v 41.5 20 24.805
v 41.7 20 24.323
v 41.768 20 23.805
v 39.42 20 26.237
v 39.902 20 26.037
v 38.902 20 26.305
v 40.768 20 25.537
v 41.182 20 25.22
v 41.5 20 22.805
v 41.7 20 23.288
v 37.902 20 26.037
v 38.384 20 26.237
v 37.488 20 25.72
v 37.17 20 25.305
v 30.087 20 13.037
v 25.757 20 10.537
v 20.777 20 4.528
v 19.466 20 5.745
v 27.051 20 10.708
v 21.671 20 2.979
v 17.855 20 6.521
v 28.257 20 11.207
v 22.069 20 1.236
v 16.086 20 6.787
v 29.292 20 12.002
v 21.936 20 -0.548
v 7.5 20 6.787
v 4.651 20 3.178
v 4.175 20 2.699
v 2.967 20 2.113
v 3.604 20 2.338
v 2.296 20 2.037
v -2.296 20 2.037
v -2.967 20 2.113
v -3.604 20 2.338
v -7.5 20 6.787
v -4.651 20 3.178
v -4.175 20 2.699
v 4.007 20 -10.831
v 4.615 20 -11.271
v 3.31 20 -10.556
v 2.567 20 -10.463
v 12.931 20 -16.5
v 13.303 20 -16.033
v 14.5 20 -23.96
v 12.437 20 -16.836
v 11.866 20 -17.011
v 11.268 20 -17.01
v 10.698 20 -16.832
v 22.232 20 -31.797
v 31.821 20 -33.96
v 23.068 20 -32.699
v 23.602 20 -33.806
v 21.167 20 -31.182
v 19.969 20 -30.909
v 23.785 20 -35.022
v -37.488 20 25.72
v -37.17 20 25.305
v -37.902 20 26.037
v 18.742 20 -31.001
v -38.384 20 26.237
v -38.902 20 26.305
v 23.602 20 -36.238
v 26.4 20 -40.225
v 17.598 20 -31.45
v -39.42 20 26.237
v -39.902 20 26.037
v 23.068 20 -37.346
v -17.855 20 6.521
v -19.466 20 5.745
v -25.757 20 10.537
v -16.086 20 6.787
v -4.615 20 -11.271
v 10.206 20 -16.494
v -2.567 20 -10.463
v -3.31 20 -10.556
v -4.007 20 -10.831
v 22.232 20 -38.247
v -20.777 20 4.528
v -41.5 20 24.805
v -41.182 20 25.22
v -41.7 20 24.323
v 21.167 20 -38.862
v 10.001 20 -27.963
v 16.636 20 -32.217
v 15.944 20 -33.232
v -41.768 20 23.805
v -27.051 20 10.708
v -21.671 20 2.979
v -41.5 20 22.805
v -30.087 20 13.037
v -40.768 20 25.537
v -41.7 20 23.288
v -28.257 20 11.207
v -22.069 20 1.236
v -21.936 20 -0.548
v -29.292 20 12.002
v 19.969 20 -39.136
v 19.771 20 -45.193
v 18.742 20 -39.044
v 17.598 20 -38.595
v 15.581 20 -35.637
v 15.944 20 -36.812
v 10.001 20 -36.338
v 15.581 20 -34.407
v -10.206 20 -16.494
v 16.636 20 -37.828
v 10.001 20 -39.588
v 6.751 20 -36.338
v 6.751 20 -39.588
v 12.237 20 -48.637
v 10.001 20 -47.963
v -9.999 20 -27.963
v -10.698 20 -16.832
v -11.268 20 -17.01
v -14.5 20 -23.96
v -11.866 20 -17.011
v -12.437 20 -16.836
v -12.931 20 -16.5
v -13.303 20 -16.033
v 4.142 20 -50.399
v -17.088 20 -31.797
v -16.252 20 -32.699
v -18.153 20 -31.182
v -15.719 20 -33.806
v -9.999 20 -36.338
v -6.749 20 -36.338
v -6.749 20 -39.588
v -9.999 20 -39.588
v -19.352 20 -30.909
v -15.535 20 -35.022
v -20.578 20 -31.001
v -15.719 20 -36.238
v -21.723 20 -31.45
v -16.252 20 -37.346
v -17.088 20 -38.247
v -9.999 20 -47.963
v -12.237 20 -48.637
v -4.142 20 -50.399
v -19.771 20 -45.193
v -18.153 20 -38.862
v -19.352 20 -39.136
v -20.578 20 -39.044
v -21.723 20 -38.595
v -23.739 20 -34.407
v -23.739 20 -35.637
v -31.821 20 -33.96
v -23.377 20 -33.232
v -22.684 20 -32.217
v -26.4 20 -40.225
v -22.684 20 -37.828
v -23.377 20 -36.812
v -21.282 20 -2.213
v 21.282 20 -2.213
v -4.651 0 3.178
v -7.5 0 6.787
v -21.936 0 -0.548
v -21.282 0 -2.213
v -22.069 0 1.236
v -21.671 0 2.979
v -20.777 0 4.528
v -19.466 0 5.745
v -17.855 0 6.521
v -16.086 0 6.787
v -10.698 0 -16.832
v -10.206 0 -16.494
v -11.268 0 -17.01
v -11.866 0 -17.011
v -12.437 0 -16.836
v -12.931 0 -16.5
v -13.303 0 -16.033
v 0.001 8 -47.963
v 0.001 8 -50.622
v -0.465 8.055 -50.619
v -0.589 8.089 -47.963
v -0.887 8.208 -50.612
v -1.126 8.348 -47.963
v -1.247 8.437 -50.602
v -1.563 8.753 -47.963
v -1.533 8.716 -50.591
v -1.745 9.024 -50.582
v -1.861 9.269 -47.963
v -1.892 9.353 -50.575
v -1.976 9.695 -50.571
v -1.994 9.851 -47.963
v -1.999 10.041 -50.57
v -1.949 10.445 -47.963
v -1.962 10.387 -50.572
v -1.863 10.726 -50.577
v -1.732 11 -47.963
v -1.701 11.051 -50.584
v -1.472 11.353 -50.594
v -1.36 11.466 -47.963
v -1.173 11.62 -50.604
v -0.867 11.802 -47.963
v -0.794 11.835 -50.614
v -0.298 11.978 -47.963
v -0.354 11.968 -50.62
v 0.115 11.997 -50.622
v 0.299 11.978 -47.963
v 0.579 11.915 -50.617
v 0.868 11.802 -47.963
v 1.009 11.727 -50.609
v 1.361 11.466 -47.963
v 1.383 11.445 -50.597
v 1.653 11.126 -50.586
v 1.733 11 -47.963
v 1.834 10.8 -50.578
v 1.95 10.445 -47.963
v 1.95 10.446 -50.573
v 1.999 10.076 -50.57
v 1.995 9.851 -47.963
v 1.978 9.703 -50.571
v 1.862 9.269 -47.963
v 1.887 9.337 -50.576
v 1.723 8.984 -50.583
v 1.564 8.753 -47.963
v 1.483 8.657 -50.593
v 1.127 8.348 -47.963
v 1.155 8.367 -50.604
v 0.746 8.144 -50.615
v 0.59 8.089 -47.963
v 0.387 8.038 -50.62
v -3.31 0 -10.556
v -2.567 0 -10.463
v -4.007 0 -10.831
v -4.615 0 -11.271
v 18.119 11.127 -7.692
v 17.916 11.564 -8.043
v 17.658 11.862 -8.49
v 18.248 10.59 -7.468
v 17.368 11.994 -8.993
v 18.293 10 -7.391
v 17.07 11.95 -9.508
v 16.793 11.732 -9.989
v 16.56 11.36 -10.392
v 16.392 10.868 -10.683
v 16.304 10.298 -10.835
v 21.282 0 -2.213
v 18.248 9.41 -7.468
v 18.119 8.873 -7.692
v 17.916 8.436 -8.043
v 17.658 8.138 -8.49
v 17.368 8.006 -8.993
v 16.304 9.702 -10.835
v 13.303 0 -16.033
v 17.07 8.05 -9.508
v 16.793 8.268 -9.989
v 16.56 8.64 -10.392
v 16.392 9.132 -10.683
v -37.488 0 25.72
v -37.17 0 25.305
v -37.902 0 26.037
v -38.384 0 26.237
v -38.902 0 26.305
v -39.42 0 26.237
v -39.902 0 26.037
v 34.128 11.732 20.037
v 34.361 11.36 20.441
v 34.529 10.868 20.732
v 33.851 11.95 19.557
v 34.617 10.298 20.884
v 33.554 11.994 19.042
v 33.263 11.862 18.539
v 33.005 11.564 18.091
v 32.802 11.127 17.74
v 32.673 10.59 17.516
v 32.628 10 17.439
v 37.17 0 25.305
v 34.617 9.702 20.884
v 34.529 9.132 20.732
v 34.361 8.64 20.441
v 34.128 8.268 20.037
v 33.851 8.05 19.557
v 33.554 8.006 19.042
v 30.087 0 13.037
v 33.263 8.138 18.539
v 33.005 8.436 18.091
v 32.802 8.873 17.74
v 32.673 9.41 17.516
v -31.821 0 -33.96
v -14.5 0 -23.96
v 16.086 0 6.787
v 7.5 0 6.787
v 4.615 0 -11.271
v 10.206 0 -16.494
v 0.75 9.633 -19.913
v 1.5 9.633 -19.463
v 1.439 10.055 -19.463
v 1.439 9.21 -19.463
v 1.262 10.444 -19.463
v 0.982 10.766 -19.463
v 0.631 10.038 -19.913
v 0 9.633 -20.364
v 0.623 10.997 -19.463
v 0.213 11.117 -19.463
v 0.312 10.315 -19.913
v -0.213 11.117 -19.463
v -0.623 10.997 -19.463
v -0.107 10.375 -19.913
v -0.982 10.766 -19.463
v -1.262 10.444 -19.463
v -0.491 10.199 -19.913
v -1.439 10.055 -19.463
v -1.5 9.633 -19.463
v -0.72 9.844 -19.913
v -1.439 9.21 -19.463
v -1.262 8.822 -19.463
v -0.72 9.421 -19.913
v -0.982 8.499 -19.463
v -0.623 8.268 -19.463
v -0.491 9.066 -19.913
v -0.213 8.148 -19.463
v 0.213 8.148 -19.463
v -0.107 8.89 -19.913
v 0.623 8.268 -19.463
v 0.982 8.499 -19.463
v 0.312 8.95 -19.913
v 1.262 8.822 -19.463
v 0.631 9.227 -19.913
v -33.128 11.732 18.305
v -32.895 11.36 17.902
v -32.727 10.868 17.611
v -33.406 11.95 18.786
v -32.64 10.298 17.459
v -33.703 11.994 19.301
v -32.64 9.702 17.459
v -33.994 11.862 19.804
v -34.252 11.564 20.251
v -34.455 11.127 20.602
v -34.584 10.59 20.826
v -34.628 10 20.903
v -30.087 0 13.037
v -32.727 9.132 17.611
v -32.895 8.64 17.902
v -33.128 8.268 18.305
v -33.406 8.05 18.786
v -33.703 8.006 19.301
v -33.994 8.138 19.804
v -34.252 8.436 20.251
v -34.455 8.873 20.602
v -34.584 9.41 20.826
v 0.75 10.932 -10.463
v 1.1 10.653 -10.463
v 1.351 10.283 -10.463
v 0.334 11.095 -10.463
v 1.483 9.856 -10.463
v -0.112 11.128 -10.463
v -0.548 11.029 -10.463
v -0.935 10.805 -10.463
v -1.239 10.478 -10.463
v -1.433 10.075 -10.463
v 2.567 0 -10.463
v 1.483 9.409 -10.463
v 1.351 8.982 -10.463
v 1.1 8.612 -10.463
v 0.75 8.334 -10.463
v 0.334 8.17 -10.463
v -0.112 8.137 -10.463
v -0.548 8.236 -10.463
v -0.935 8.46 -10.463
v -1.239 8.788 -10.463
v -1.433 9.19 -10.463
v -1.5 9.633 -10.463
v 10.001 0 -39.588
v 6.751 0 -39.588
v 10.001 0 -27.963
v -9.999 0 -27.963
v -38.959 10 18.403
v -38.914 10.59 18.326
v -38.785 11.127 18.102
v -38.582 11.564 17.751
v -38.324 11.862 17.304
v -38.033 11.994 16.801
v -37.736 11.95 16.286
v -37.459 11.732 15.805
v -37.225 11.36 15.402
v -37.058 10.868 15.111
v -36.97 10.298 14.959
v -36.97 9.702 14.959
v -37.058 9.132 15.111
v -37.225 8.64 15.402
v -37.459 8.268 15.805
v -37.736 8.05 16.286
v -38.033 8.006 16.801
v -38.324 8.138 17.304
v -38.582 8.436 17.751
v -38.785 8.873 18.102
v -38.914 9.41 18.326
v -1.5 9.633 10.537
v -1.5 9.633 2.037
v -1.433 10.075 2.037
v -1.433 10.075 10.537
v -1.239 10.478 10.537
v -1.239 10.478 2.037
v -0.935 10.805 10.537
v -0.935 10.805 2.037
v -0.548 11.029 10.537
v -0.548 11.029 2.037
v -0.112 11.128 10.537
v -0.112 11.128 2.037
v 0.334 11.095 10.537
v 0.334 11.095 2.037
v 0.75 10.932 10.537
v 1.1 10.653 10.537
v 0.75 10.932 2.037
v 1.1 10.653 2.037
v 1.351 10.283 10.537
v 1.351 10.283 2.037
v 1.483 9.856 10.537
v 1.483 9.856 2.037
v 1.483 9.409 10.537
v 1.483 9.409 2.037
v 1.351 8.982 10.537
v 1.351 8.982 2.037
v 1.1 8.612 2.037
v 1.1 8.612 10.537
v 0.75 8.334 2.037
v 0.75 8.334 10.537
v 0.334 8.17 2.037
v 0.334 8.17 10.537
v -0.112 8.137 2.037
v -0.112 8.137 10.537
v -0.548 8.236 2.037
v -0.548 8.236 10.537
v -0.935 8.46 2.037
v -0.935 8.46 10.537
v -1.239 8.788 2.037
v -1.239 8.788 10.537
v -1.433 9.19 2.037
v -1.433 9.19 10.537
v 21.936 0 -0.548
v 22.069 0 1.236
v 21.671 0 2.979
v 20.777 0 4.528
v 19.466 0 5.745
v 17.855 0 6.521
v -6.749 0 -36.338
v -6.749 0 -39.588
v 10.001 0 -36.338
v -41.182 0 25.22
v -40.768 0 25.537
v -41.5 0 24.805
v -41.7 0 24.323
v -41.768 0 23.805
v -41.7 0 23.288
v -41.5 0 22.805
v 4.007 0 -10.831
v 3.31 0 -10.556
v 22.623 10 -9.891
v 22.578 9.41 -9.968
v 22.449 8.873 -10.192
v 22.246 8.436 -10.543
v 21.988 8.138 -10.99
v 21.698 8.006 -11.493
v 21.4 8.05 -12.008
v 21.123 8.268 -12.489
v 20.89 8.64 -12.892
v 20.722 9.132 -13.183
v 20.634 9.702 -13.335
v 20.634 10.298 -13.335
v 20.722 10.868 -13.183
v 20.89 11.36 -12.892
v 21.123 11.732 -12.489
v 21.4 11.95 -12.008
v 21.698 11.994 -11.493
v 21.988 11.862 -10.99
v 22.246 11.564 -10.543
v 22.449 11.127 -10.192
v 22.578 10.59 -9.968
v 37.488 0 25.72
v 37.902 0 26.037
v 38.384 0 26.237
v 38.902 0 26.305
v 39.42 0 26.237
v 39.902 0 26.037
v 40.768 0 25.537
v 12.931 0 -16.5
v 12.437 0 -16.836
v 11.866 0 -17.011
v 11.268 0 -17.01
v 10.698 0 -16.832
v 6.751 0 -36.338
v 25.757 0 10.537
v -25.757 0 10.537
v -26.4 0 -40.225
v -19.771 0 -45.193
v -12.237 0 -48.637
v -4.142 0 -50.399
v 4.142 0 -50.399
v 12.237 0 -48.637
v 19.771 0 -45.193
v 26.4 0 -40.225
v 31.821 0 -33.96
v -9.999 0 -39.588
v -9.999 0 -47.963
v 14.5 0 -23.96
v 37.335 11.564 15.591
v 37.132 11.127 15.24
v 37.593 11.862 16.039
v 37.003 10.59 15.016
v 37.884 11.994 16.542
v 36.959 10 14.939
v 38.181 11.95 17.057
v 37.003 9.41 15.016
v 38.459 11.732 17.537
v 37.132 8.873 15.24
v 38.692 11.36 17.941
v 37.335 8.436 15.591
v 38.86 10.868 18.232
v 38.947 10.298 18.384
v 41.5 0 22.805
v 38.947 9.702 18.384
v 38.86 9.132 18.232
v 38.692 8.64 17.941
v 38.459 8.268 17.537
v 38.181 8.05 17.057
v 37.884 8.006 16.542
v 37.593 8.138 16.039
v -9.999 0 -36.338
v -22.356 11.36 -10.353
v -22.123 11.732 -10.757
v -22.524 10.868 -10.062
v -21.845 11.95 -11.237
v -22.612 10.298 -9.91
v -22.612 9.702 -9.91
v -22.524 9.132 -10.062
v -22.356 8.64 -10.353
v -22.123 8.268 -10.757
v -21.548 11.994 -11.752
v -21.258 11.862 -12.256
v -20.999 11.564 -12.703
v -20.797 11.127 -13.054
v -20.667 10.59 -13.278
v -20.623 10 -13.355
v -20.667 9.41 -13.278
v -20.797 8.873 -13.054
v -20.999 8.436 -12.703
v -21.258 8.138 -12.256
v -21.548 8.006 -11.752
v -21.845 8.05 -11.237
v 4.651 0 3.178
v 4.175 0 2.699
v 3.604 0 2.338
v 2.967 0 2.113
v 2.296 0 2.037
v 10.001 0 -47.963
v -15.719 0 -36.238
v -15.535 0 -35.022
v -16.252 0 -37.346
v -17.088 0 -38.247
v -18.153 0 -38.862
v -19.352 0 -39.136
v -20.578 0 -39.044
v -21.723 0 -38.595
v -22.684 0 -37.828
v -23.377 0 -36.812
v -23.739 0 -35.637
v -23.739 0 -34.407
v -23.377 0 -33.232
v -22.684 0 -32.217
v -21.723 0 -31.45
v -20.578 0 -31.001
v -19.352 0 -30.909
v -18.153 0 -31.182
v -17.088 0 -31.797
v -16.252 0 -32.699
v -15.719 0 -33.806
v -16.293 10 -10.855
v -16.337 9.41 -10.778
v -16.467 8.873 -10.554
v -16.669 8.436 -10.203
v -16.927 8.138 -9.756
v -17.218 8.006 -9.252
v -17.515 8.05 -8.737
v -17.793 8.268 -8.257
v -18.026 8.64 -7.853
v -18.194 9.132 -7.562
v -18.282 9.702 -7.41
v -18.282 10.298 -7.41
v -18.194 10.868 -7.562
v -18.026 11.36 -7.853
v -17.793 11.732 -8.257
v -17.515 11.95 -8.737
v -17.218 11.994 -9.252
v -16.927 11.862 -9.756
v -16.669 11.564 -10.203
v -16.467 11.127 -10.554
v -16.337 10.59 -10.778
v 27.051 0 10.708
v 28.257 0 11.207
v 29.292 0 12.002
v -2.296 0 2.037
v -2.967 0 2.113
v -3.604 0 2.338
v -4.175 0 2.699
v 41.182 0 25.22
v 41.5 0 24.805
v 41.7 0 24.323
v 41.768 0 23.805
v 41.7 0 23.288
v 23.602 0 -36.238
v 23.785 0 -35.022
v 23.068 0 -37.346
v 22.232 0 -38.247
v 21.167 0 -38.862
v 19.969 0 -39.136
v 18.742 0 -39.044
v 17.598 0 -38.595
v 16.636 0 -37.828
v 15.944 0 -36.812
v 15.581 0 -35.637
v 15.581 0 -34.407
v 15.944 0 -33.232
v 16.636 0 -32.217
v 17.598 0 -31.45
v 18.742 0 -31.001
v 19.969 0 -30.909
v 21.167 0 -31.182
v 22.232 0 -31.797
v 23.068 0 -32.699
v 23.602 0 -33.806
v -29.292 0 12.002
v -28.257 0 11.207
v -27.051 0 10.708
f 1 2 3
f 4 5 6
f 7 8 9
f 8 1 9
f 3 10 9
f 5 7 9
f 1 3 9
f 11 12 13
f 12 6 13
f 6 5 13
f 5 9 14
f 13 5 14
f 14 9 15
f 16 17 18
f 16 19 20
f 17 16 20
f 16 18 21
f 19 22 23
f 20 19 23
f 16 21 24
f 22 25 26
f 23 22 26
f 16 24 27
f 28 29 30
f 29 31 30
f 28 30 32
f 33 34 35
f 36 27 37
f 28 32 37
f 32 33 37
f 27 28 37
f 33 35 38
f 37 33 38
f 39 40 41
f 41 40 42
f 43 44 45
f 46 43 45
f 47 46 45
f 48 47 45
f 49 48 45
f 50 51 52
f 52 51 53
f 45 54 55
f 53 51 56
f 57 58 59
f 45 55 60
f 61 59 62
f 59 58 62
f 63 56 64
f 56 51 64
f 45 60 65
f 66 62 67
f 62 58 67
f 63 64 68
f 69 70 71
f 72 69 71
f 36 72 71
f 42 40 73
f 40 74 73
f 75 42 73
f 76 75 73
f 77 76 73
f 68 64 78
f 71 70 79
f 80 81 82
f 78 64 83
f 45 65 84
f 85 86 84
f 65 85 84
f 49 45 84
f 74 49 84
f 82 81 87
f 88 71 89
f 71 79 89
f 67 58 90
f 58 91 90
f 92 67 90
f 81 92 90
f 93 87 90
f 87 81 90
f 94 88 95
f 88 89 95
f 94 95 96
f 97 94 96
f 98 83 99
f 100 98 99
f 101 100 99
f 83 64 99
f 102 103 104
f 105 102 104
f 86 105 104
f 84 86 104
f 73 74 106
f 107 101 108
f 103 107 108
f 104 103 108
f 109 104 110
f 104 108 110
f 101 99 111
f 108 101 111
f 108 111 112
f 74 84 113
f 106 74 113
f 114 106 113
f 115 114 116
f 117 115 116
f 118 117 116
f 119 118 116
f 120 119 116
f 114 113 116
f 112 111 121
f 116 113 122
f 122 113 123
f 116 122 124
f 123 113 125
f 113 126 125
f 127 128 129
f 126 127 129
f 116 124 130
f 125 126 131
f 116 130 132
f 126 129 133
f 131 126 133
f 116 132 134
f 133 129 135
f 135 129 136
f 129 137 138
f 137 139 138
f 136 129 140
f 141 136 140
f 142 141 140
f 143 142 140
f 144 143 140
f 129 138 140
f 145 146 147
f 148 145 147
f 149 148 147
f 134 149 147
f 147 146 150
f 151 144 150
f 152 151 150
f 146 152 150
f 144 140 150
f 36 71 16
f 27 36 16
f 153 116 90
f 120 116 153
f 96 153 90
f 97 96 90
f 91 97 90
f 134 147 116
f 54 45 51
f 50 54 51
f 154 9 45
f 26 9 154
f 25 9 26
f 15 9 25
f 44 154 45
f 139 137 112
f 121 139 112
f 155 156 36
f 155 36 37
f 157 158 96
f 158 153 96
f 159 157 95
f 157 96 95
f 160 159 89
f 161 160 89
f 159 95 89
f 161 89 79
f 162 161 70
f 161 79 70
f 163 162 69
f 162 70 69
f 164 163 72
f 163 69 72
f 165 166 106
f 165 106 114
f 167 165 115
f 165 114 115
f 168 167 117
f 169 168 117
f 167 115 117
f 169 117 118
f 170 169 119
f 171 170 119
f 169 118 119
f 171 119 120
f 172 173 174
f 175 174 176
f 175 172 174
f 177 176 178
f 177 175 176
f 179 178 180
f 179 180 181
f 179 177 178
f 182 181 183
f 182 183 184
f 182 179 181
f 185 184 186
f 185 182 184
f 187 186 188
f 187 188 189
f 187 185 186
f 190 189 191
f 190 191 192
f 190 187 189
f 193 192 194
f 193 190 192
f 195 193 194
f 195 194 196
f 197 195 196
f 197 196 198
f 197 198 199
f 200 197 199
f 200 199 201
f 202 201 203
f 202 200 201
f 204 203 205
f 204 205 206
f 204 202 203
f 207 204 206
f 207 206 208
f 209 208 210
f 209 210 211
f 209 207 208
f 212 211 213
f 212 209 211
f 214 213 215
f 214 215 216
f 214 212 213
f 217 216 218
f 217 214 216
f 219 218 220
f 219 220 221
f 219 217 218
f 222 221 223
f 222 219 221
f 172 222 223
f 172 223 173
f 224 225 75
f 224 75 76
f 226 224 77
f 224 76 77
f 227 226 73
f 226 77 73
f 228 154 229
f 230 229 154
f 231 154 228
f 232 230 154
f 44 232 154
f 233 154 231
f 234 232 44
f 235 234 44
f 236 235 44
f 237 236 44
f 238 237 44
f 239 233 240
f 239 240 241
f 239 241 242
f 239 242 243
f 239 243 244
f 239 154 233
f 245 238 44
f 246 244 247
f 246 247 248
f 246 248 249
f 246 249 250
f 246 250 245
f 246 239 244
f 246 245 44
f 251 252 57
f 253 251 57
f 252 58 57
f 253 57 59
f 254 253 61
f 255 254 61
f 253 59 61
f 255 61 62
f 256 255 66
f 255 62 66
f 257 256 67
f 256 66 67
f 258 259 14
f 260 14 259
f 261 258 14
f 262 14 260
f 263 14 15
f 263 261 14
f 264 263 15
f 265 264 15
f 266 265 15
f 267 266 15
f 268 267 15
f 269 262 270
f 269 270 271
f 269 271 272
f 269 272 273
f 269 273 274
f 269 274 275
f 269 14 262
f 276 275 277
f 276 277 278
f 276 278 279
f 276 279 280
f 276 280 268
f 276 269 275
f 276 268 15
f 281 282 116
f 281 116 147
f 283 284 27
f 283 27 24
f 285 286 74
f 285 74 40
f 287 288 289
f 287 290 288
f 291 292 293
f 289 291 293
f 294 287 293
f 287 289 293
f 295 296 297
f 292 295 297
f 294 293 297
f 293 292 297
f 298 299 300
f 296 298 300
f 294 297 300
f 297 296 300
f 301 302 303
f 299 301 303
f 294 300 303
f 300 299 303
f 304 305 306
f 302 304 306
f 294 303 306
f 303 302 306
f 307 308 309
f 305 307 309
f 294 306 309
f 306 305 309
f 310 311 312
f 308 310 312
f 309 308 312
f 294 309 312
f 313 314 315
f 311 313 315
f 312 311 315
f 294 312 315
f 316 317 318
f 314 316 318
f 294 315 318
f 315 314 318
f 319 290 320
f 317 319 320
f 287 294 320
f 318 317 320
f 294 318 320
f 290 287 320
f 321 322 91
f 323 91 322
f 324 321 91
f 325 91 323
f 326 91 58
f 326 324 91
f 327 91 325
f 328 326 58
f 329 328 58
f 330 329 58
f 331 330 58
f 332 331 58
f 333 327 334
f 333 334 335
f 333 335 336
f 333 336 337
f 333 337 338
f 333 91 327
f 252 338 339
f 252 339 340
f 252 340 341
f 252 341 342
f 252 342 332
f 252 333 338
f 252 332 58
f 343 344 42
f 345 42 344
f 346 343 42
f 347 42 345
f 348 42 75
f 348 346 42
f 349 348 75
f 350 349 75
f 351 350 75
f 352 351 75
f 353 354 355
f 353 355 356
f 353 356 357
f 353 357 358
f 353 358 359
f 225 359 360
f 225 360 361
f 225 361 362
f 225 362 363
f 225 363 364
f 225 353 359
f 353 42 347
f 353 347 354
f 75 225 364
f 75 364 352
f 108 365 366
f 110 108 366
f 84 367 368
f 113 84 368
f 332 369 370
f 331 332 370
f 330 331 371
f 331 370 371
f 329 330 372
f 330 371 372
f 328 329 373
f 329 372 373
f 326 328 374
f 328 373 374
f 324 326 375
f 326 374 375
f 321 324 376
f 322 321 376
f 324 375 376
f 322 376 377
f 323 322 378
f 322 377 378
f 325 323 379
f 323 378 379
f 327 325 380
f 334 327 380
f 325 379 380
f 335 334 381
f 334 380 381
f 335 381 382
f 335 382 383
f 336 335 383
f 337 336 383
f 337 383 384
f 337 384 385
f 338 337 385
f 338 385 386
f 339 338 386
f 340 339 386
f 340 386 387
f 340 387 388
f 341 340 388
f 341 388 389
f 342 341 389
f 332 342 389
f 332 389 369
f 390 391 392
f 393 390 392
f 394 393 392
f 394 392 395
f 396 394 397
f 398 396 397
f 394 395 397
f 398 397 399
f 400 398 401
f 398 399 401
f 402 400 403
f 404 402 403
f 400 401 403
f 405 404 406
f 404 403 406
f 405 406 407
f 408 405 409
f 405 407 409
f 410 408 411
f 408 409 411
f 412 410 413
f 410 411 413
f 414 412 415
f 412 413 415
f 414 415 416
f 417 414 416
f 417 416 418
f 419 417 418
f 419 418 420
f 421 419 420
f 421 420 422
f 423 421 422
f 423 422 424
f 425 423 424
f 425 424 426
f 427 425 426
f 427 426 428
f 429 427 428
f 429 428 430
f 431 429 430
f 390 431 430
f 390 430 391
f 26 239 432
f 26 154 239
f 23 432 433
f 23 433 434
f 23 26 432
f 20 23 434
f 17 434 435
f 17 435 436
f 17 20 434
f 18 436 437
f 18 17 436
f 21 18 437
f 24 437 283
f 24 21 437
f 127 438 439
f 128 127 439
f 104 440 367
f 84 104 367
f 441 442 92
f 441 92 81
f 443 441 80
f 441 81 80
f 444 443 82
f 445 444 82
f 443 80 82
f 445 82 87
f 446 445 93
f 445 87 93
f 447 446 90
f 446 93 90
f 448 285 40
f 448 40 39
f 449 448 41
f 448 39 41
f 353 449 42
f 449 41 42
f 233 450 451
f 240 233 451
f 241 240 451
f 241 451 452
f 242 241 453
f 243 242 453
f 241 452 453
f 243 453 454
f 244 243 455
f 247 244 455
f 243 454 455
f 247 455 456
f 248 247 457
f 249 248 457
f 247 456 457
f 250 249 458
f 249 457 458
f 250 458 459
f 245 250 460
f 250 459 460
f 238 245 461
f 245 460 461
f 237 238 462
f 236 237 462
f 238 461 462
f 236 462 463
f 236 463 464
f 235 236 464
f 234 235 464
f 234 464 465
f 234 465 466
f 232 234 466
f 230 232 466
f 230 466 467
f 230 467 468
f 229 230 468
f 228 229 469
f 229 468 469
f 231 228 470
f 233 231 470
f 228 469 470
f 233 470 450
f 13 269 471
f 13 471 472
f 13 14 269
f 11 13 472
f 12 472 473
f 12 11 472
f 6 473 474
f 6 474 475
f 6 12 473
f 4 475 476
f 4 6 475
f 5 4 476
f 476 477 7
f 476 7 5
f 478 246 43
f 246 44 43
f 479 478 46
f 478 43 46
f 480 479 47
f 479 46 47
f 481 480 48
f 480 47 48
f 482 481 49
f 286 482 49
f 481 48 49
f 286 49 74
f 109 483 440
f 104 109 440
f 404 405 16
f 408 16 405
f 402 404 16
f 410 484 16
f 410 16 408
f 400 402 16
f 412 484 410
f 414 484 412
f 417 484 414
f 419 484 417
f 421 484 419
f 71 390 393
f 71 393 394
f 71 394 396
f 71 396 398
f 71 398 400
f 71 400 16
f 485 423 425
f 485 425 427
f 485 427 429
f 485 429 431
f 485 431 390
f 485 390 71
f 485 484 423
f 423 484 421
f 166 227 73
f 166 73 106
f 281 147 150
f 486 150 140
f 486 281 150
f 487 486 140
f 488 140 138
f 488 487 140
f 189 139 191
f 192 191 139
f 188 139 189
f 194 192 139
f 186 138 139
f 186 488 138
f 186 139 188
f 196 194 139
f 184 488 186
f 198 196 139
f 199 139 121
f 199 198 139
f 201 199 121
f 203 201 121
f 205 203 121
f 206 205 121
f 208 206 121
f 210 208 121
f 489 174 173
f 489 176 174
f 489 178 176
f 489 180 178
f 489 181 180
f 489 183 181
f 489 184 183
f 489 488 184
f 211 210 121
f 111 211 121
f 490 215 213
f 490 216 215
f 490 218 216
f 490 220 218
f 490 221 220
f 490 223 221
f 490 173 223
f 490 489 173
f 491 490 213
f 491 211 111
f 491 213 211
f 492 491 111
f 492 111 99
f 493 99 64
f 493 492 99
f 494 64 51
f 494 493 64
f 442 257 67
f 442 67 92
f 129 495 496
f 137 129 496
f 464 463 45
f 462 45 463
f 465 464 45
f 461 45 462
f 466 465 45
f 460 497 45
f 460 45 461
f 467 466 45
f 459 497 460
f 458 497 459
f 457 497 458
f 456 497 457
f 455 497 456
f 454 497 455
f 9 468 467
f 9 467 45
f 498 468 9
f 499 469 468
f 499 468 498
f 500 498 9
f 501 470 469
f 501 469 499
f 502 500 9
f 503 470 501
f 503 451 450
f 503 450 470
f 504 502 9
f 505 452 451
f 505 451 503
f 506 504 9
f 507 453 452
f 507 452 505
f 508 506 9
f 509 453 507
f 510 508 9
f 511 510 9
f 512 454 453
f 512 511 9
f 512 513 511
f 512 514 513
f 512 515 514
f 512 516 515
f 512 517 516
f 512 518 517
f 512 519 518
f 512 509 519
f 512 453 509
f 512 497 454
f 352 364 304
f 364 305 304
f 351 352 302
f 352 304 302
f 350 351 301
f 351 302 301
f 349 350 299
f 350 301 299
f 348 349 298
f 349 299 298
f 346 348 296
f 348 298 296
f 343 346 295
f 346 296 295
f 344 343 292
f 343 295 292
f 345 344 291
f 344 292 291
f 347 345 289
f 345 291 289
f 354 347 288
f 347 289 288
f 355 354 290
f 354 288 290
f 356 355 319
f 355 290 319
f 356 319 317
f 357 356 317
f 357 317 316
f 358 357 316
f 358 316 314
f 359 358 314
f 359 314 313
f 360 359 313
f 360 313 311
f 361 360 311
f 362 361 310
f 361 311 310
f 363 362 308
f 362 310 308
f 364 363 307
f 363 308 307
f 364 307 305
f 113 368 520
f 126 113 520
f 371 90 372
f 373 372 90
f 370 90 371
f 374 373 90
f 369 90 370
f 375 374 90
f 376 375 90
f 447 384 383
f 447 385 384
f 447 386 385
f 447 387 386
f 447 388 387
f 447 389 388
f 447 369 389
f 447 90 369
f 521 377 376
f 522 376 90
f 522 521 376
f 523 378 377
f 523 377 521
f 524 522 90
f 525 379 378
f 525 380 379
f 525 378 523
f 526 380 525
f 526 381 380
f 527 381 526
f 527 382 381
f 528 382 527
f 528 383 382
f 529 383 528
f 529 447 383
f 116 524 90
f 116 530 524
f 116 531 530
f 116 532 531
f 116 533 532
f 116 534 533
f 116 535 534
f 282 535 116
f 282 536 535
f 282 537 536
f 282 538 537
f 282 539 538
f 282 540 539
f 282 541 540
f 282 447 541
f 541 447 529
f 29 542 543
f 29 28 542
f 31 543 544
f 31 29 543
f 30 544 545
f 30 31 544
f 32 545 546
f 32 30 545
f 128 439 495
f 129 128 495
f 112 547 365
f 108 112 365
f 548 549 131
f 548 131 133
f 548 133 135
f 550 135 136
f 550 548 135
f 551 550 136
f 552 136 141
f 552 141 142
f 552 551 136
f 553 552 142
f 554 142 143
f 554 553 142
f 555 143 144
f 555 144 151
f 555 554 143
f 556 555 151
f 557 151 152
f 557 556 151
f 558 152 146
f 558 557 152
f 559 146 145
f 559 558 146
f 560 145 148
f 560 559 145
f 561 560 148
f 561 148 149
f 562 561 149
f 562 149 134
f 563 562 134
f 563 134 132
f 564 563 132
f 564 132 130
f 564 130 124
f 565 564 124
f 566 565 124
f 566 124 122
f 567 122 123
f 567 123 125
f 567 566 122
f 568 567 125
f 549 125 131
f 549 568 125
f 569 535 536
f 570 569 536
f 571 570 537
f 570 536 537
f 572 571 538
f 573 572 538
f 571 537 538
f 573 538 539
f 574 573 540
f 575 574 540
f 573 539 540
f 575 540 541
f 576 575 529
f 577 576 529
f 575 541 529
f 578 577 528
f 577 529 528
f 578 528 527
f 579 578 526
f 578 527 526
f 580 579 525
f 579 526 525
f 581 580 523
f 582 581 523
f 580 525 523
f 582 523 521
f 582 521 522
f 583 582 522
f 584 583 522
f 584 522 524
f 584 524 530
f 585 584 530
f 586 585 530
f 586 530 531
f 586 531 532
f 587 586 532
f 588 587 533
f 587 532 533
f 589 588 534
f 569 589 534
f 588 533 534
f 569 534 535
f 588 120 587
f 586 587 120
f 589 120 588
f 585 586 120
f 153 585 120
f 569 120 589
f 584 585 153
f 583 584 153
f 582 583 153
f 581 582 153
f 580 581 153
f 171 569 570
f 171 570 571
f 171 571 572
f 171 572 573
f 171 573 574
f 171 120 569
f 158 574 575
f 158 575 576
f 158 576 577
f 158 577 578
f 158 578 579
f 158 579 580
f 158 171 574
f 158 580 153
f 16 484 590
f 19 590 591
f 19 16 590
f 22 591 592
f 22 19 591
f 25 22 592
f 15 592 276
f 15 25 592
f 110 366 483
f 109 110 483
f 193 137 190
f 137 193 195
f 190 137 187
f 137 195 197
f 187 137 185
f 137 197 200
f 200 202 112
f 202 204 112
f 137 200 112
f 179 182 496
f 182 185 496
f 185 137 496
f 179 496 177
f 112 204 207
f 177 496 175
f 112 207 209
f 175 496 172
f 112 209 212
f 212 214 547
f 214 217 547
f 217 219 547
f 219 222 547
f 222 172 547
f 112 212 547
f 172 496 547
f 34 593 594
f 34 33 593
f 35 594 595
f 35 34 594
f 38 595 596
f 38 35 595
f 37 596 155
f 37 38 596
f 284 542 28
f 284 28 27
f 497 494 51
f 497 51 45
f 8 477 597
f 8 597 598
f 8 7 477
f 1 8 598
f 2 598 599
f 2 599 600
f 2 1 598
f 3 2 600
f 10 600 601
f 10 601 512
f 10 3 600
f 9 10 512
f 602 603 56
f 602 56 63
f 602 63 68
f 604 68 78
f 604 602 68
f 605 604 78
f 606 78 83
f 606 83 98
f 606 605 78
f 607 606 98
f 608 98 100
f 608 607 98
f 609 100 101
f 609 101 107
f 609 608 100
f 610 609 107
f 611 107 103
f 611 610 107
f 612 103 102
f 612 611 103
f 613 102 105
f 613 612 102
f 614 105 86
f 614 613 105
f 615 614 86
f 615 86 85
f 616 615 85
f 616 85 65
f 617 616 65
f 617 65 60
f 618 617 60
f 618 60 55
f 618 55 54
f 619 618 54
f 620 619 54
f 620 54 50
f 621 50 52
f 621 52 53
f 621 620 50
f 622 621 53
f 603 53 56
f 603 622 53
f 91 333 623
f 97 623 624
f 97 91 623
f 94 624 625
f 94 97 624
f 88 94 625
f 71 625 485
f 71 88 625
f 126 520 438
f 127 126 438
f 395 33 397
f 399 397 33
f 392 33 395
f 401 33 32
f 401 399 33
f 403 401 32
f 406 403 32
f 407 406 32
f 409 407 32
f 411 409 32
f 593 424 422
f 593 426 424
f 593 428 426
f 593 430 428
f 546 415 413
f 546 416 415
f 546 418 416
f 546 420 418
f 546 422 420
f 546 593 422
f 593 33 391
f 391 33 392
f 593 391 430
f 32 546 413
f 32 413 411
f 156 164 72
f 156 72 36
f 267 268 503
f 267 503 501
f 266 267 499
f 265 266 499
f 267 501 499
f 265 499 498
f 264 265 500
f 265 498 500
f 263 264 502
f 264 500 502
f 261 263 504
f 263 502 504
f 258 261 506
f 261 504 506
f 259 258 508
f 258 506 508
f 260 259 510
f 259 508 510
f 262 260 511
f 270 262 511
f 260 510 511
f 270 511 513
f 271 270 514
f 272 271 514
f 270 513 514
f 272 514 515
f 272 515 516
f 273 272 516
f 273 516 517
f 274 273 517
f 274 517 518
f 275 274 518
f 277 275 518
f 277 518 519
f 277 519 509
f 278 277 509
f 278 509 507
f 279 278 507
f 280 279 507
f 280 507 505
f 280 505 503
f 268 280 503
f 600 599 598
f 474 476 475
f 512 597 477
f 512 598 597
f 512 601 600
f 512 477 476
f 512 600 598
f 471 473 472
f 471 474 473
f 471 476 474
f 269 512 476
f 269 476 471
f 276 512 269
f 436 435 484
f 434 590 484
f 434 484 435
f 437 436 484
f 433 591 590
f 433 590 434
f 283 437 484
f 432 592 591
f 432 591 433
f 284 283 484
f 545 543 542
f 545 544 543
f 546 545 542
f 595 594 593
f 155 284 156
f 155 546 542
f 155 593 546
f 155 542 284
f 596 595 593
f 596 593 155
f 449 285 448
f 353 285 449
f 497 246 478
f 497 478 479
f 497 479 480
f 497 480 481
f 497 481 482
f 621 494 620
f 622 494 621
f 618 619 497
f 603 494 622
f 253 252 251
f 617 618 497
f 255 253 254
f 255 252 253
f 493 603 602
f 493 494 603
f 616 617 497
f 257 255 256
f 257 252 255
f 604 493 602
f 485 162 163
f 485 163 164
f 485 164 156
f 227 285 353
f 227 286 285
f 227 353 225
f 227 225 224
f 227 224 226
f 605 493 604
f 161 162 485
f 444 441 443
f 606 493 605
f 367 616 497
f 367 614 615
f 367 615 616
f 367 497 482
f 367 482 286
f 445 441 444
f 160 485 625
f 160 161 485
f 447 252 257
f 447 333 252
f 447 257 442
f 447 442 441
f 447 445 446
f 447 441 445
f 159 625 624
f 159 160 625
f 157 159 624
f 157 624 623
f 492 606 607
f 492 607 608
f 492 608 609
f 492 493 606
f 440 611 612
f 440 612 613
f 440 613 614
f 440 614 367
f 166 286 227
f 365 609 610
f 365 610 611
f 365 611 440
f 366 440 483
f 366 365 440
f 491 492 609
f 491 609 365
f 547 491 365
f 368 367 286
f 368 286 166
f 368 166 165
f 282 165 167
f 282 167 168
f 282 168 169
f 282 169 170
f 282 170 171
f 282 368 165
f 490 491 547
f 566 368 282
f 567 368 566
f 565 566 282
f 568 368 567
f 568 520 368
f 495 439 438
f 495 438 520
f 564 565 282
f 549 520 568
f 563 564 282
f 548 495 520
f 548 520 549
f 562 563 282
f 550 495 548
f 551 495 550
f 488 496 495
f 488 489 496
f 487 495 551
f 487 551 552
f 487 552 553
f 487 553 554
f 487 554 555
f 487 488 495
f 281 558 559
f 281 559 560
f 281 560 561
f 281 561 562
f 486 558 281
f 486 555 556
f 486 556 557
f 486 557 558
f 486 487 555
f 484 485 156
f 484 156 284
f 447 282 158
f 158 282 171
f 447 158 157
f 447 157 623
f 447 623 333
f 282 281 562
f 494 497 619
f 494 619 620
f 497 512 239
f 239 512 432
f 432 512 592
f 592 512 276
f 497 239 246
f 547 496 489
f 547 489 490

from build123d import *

# Parameters (mm, degrees)
SKETCH1_R                  = 4.125
BOSS_EXTRUDE1_DEPTH        = 20
FILLET2_R                  = 5
FILLET3_R                  = 5
FILLET4_R                  = 6
FILLET5_R                  = 6
FILLET6_R                  = 2
FILLET7_R                  = 3
FILLET10_R                 = 2
UPPER_VERTEX_HOLES_D       = 3
UPPER_VERTEX_HOLES_DEPTH   = 30
UPPER_VERTEX_HOLES_TIP     = 0.901290929
F_8_0_199_DIAMETER_HOLE2_D = 4
F_8_0_199_DIAMETER_HOLE3_D = 4
SKETCH12_W                 = 2
SKETCH12_H                 = 41.945563192
SKETCH16_W                 = 2
SKETCH16_H                 = 41.945563192


with BuildPart() as part:
    # Sketch1 → Boss-Extrude1 (new body)
    with BuildSketch(Plane(origin=(0, 0, 0), x_dir=(1, 0, 0), z_dir=(0, 1, 0))):
        with BuildLine():
            Line((-28.643593539, -10.537386441), (-38.169872981, -27.037386441))
            Line((-38.169872981, -27.037386441), (-42.5, -24.537386441))
            Line((-42.5, -24.537386441), (-14.5, 23.960036171))
            Line((-14.5, 23.960036171), (-31.820508076, 33.960036171))
            ThreePointArc((-31.820508076, 33.960036171), (0, 50.621689136), (31.820508076, 33.960036171))
            Line((31.820508076, 33.960036171), (14.5, 23.960036171))
            Line((14.5, 23.960036171), (42.5, -24.537386441))
            Line((42.5, -24.537386441), (38.169872981, -27.037386441))
            Line((38.169872981, -27.037386441), (28.643593539, -10.537386441))
            Line((28.643593539, -10.537386441), (-28.643593539, -10.537386441))
        make_face()
        with Locations((19.660254038, 35.022213998)):
            Circle(SKETCH1_R, mode=Mode.SUBTRACT)
        with Locations((-19.660254038, 35.022213998)):
            Circle(SKETCH1_R, mode=Mode.SUBTRACT)
        Polygon((-12.0447733, 18.212613559), (-26.47853003, -6.787386441), (-7.5, -6.787386441), (-3.75, -2.037386441), (3.75, -2.037386441), (7.5, -6.787386441), (26.47853003, -6.787386441), (12.0447733, 18.212613559), (3.75, 10.462613559), (-3.75, 10.462613559), align=None, mode=Mode.SUBTRACT)
        Polygon((-9.999491924, 47.962613559), (10.000508076, 47.962613559), (10.000508076, 39.587613559), (6.750508076, 39.587613559), (6.750508076, 36.337613559), (10.000508076, 36.337613559), (10.000508076, 27.962613559), (-9.999491924, 27.962613559), (-9.999491924, 36.337613559), (-6.749491924, 36.337613559), (-6.749491924, 39.587613559), (-9.999491924, 39.587613559), align=None, mode=Mode.SUBTRACT)
    extrude(amount=BOSS_EXTRUDE1_DEPTH)

    # Fillet2
    fillet2_edges = [part.edges().sort_by_distance(p)[0] for p in [
        (-28.643593539, 10, 10.537386441),
    ]]
    fillet(fillet2_edges, radius=FILLET2_R)

    # Fillet3
    fillet3_edges = [part.edges().sort_by_distance(p)[0] for p in [
        (28.643593539, 10, 10.537386441),
    ]]
    fillet(fillet3_edges, radius=FILLET3_R)

    # Fillet4
    fillet4_edges = [part.edges().sort_by_distance(p)[0] for p in [
        (-26.47853003, 10, 6.787386441),
    ]]
    fillet(fillet4_edges, radius=FILLET4_R)

    # Fillet5
    fillet5_edges = [part.edges().sort_by_distance(p)[0] for p in [
        (26.47853003, 10, 6.787386441),
    ]]
    fillet(fillet5_edges, radius=FILLET5_R)

    # Fillet6
    fillet6_edges = [part.edges().sort_by_distance(p)[0] for p in [
        (-12.0447733, 10, -18.212613559),
        (12.0447733, 10, -18.212613559),
    ]]
    fillet(fillet6_edges, radius=FILLET6_R)

    # Fillet7
    fillet7_edges = [part.edges().sort_by_distance(p)[0] for p in [
        (-3.75, 10, -10.462613559),
        (-3.75, 10, 2.037386441),
        (3.75, 10, 2.037386441),
        (3.75, 10, -10.462613559),
    ]]
    fillet(fillet7_edges, radius=FILLET7_R)

    # Fillet10
    fillet10_edges = [part.edges().sort_by_distance(p)[0] for p in [
        (-38.169872981, 10, 27.037386441),
        (-42.5, 10, 24.537386441),
        (42.5, 10, 24.537386441),
        (38.169872981, 10, 27.037386441),
    ]]
    fillet(fillet10_edges, radius=FILLET10_R)

    # Upper Vertex Holes
    with Locations(Plane.XY.offset(10.537386441)):
        with Locations((0, 9.632614612)):
            Hole(UPPER_VERTEX_HOLES_D / 2, depth=UPPER_VERTEX_HOLES_DEPTH)
            with Locations((0, 0, -(UPPER_VERTEX_HOLES_DEPTH + UPPER_VERTEX_HOLES_TIP / 2))):  # 118° drill point
                Cone(0, UPPER_VERTEX_HOLES_D / 2, UPPER_VERTEX_HOLES_TIP, mode=Mode.SUBTRACT)

    # #8 (0.199) Diameter Hole2 (through all)
    with Locations(Plane(origin=(16.919872981, 0, -9.76869322), x_dir=(0.5, 0, 0.866025404), z_dir=(-0.866025404, 0, 0.5))):
        with Locations((33.417096231, 10)):
            Hole(F_8_0_199_DIAMETER_HOLE2_D / 2)

    # #8 (0.199) Diameter Hole3 (through all)
    with Locations(Plane(origin=(-16.919872981, 0, -9.76869322), x_dir=(0.5, 0, -0.866025404), z_dir=(0.866025404, 0, 0.5))):
        with Locations((-33.417096231, 10)):
            Hole(F_8_0_199_DIAMETER_HOLE3_D / 2)

    # Sketch12 → #8 (0.199) Diameter Hole5 (revolve, cut)
    with BuildSketch(Plane(origin=(17.292785365, 10, -9.122790024), x_dir=(0.5, 0, 0.866025404), z_dir=(0, 1, 0))):
        with Locations((1, 20.972781596)):
            Rectangle(SKETCH12_W, SKETCH12_H)
    revolve(axis=Axis((11.793524051, 10, -5.947790024), (0.866025404, 0, -0.5)), mode=Mode.SUBTRACT)

    # Sketch16 → #8 (0.199) Diameter Hole6 (revolve, cut)
    with BuildSketch(Plane(origin=(-17.292785365, 10, -9.122790024), x_dir=(0.5, 0, -0.866025404), z_dir=(0, 1, 0))):
        with Locations((1, 20.972781596)):
            Rectangle(SKETCH16_W, SKETCH16_H)
    revolve(axis=Axis((-11.793524051, 10, -5.947790024), (-0.866025404, 0, -0.5)), mode=Mode.SUBTRACT)

    # Sketch18 → #8 (0.199) Diameter Hole7 (revolve, cut)
    with BuildSketch(Plane(origin=(0.000508076, 10, -47.962613559), x_dir=(0, -1, 0), z_dir=(1, 0, 0))):
        Polygon((0, 0), (0, 31.2017212), (1.999999937, 30), (1.999999937, 0), align=None)
    revolve(axis=Axis((0.000508076, 10, -41.612613559), (0, 0, -1)), mode=Mode.SUBTRACT)


solid = part.part
